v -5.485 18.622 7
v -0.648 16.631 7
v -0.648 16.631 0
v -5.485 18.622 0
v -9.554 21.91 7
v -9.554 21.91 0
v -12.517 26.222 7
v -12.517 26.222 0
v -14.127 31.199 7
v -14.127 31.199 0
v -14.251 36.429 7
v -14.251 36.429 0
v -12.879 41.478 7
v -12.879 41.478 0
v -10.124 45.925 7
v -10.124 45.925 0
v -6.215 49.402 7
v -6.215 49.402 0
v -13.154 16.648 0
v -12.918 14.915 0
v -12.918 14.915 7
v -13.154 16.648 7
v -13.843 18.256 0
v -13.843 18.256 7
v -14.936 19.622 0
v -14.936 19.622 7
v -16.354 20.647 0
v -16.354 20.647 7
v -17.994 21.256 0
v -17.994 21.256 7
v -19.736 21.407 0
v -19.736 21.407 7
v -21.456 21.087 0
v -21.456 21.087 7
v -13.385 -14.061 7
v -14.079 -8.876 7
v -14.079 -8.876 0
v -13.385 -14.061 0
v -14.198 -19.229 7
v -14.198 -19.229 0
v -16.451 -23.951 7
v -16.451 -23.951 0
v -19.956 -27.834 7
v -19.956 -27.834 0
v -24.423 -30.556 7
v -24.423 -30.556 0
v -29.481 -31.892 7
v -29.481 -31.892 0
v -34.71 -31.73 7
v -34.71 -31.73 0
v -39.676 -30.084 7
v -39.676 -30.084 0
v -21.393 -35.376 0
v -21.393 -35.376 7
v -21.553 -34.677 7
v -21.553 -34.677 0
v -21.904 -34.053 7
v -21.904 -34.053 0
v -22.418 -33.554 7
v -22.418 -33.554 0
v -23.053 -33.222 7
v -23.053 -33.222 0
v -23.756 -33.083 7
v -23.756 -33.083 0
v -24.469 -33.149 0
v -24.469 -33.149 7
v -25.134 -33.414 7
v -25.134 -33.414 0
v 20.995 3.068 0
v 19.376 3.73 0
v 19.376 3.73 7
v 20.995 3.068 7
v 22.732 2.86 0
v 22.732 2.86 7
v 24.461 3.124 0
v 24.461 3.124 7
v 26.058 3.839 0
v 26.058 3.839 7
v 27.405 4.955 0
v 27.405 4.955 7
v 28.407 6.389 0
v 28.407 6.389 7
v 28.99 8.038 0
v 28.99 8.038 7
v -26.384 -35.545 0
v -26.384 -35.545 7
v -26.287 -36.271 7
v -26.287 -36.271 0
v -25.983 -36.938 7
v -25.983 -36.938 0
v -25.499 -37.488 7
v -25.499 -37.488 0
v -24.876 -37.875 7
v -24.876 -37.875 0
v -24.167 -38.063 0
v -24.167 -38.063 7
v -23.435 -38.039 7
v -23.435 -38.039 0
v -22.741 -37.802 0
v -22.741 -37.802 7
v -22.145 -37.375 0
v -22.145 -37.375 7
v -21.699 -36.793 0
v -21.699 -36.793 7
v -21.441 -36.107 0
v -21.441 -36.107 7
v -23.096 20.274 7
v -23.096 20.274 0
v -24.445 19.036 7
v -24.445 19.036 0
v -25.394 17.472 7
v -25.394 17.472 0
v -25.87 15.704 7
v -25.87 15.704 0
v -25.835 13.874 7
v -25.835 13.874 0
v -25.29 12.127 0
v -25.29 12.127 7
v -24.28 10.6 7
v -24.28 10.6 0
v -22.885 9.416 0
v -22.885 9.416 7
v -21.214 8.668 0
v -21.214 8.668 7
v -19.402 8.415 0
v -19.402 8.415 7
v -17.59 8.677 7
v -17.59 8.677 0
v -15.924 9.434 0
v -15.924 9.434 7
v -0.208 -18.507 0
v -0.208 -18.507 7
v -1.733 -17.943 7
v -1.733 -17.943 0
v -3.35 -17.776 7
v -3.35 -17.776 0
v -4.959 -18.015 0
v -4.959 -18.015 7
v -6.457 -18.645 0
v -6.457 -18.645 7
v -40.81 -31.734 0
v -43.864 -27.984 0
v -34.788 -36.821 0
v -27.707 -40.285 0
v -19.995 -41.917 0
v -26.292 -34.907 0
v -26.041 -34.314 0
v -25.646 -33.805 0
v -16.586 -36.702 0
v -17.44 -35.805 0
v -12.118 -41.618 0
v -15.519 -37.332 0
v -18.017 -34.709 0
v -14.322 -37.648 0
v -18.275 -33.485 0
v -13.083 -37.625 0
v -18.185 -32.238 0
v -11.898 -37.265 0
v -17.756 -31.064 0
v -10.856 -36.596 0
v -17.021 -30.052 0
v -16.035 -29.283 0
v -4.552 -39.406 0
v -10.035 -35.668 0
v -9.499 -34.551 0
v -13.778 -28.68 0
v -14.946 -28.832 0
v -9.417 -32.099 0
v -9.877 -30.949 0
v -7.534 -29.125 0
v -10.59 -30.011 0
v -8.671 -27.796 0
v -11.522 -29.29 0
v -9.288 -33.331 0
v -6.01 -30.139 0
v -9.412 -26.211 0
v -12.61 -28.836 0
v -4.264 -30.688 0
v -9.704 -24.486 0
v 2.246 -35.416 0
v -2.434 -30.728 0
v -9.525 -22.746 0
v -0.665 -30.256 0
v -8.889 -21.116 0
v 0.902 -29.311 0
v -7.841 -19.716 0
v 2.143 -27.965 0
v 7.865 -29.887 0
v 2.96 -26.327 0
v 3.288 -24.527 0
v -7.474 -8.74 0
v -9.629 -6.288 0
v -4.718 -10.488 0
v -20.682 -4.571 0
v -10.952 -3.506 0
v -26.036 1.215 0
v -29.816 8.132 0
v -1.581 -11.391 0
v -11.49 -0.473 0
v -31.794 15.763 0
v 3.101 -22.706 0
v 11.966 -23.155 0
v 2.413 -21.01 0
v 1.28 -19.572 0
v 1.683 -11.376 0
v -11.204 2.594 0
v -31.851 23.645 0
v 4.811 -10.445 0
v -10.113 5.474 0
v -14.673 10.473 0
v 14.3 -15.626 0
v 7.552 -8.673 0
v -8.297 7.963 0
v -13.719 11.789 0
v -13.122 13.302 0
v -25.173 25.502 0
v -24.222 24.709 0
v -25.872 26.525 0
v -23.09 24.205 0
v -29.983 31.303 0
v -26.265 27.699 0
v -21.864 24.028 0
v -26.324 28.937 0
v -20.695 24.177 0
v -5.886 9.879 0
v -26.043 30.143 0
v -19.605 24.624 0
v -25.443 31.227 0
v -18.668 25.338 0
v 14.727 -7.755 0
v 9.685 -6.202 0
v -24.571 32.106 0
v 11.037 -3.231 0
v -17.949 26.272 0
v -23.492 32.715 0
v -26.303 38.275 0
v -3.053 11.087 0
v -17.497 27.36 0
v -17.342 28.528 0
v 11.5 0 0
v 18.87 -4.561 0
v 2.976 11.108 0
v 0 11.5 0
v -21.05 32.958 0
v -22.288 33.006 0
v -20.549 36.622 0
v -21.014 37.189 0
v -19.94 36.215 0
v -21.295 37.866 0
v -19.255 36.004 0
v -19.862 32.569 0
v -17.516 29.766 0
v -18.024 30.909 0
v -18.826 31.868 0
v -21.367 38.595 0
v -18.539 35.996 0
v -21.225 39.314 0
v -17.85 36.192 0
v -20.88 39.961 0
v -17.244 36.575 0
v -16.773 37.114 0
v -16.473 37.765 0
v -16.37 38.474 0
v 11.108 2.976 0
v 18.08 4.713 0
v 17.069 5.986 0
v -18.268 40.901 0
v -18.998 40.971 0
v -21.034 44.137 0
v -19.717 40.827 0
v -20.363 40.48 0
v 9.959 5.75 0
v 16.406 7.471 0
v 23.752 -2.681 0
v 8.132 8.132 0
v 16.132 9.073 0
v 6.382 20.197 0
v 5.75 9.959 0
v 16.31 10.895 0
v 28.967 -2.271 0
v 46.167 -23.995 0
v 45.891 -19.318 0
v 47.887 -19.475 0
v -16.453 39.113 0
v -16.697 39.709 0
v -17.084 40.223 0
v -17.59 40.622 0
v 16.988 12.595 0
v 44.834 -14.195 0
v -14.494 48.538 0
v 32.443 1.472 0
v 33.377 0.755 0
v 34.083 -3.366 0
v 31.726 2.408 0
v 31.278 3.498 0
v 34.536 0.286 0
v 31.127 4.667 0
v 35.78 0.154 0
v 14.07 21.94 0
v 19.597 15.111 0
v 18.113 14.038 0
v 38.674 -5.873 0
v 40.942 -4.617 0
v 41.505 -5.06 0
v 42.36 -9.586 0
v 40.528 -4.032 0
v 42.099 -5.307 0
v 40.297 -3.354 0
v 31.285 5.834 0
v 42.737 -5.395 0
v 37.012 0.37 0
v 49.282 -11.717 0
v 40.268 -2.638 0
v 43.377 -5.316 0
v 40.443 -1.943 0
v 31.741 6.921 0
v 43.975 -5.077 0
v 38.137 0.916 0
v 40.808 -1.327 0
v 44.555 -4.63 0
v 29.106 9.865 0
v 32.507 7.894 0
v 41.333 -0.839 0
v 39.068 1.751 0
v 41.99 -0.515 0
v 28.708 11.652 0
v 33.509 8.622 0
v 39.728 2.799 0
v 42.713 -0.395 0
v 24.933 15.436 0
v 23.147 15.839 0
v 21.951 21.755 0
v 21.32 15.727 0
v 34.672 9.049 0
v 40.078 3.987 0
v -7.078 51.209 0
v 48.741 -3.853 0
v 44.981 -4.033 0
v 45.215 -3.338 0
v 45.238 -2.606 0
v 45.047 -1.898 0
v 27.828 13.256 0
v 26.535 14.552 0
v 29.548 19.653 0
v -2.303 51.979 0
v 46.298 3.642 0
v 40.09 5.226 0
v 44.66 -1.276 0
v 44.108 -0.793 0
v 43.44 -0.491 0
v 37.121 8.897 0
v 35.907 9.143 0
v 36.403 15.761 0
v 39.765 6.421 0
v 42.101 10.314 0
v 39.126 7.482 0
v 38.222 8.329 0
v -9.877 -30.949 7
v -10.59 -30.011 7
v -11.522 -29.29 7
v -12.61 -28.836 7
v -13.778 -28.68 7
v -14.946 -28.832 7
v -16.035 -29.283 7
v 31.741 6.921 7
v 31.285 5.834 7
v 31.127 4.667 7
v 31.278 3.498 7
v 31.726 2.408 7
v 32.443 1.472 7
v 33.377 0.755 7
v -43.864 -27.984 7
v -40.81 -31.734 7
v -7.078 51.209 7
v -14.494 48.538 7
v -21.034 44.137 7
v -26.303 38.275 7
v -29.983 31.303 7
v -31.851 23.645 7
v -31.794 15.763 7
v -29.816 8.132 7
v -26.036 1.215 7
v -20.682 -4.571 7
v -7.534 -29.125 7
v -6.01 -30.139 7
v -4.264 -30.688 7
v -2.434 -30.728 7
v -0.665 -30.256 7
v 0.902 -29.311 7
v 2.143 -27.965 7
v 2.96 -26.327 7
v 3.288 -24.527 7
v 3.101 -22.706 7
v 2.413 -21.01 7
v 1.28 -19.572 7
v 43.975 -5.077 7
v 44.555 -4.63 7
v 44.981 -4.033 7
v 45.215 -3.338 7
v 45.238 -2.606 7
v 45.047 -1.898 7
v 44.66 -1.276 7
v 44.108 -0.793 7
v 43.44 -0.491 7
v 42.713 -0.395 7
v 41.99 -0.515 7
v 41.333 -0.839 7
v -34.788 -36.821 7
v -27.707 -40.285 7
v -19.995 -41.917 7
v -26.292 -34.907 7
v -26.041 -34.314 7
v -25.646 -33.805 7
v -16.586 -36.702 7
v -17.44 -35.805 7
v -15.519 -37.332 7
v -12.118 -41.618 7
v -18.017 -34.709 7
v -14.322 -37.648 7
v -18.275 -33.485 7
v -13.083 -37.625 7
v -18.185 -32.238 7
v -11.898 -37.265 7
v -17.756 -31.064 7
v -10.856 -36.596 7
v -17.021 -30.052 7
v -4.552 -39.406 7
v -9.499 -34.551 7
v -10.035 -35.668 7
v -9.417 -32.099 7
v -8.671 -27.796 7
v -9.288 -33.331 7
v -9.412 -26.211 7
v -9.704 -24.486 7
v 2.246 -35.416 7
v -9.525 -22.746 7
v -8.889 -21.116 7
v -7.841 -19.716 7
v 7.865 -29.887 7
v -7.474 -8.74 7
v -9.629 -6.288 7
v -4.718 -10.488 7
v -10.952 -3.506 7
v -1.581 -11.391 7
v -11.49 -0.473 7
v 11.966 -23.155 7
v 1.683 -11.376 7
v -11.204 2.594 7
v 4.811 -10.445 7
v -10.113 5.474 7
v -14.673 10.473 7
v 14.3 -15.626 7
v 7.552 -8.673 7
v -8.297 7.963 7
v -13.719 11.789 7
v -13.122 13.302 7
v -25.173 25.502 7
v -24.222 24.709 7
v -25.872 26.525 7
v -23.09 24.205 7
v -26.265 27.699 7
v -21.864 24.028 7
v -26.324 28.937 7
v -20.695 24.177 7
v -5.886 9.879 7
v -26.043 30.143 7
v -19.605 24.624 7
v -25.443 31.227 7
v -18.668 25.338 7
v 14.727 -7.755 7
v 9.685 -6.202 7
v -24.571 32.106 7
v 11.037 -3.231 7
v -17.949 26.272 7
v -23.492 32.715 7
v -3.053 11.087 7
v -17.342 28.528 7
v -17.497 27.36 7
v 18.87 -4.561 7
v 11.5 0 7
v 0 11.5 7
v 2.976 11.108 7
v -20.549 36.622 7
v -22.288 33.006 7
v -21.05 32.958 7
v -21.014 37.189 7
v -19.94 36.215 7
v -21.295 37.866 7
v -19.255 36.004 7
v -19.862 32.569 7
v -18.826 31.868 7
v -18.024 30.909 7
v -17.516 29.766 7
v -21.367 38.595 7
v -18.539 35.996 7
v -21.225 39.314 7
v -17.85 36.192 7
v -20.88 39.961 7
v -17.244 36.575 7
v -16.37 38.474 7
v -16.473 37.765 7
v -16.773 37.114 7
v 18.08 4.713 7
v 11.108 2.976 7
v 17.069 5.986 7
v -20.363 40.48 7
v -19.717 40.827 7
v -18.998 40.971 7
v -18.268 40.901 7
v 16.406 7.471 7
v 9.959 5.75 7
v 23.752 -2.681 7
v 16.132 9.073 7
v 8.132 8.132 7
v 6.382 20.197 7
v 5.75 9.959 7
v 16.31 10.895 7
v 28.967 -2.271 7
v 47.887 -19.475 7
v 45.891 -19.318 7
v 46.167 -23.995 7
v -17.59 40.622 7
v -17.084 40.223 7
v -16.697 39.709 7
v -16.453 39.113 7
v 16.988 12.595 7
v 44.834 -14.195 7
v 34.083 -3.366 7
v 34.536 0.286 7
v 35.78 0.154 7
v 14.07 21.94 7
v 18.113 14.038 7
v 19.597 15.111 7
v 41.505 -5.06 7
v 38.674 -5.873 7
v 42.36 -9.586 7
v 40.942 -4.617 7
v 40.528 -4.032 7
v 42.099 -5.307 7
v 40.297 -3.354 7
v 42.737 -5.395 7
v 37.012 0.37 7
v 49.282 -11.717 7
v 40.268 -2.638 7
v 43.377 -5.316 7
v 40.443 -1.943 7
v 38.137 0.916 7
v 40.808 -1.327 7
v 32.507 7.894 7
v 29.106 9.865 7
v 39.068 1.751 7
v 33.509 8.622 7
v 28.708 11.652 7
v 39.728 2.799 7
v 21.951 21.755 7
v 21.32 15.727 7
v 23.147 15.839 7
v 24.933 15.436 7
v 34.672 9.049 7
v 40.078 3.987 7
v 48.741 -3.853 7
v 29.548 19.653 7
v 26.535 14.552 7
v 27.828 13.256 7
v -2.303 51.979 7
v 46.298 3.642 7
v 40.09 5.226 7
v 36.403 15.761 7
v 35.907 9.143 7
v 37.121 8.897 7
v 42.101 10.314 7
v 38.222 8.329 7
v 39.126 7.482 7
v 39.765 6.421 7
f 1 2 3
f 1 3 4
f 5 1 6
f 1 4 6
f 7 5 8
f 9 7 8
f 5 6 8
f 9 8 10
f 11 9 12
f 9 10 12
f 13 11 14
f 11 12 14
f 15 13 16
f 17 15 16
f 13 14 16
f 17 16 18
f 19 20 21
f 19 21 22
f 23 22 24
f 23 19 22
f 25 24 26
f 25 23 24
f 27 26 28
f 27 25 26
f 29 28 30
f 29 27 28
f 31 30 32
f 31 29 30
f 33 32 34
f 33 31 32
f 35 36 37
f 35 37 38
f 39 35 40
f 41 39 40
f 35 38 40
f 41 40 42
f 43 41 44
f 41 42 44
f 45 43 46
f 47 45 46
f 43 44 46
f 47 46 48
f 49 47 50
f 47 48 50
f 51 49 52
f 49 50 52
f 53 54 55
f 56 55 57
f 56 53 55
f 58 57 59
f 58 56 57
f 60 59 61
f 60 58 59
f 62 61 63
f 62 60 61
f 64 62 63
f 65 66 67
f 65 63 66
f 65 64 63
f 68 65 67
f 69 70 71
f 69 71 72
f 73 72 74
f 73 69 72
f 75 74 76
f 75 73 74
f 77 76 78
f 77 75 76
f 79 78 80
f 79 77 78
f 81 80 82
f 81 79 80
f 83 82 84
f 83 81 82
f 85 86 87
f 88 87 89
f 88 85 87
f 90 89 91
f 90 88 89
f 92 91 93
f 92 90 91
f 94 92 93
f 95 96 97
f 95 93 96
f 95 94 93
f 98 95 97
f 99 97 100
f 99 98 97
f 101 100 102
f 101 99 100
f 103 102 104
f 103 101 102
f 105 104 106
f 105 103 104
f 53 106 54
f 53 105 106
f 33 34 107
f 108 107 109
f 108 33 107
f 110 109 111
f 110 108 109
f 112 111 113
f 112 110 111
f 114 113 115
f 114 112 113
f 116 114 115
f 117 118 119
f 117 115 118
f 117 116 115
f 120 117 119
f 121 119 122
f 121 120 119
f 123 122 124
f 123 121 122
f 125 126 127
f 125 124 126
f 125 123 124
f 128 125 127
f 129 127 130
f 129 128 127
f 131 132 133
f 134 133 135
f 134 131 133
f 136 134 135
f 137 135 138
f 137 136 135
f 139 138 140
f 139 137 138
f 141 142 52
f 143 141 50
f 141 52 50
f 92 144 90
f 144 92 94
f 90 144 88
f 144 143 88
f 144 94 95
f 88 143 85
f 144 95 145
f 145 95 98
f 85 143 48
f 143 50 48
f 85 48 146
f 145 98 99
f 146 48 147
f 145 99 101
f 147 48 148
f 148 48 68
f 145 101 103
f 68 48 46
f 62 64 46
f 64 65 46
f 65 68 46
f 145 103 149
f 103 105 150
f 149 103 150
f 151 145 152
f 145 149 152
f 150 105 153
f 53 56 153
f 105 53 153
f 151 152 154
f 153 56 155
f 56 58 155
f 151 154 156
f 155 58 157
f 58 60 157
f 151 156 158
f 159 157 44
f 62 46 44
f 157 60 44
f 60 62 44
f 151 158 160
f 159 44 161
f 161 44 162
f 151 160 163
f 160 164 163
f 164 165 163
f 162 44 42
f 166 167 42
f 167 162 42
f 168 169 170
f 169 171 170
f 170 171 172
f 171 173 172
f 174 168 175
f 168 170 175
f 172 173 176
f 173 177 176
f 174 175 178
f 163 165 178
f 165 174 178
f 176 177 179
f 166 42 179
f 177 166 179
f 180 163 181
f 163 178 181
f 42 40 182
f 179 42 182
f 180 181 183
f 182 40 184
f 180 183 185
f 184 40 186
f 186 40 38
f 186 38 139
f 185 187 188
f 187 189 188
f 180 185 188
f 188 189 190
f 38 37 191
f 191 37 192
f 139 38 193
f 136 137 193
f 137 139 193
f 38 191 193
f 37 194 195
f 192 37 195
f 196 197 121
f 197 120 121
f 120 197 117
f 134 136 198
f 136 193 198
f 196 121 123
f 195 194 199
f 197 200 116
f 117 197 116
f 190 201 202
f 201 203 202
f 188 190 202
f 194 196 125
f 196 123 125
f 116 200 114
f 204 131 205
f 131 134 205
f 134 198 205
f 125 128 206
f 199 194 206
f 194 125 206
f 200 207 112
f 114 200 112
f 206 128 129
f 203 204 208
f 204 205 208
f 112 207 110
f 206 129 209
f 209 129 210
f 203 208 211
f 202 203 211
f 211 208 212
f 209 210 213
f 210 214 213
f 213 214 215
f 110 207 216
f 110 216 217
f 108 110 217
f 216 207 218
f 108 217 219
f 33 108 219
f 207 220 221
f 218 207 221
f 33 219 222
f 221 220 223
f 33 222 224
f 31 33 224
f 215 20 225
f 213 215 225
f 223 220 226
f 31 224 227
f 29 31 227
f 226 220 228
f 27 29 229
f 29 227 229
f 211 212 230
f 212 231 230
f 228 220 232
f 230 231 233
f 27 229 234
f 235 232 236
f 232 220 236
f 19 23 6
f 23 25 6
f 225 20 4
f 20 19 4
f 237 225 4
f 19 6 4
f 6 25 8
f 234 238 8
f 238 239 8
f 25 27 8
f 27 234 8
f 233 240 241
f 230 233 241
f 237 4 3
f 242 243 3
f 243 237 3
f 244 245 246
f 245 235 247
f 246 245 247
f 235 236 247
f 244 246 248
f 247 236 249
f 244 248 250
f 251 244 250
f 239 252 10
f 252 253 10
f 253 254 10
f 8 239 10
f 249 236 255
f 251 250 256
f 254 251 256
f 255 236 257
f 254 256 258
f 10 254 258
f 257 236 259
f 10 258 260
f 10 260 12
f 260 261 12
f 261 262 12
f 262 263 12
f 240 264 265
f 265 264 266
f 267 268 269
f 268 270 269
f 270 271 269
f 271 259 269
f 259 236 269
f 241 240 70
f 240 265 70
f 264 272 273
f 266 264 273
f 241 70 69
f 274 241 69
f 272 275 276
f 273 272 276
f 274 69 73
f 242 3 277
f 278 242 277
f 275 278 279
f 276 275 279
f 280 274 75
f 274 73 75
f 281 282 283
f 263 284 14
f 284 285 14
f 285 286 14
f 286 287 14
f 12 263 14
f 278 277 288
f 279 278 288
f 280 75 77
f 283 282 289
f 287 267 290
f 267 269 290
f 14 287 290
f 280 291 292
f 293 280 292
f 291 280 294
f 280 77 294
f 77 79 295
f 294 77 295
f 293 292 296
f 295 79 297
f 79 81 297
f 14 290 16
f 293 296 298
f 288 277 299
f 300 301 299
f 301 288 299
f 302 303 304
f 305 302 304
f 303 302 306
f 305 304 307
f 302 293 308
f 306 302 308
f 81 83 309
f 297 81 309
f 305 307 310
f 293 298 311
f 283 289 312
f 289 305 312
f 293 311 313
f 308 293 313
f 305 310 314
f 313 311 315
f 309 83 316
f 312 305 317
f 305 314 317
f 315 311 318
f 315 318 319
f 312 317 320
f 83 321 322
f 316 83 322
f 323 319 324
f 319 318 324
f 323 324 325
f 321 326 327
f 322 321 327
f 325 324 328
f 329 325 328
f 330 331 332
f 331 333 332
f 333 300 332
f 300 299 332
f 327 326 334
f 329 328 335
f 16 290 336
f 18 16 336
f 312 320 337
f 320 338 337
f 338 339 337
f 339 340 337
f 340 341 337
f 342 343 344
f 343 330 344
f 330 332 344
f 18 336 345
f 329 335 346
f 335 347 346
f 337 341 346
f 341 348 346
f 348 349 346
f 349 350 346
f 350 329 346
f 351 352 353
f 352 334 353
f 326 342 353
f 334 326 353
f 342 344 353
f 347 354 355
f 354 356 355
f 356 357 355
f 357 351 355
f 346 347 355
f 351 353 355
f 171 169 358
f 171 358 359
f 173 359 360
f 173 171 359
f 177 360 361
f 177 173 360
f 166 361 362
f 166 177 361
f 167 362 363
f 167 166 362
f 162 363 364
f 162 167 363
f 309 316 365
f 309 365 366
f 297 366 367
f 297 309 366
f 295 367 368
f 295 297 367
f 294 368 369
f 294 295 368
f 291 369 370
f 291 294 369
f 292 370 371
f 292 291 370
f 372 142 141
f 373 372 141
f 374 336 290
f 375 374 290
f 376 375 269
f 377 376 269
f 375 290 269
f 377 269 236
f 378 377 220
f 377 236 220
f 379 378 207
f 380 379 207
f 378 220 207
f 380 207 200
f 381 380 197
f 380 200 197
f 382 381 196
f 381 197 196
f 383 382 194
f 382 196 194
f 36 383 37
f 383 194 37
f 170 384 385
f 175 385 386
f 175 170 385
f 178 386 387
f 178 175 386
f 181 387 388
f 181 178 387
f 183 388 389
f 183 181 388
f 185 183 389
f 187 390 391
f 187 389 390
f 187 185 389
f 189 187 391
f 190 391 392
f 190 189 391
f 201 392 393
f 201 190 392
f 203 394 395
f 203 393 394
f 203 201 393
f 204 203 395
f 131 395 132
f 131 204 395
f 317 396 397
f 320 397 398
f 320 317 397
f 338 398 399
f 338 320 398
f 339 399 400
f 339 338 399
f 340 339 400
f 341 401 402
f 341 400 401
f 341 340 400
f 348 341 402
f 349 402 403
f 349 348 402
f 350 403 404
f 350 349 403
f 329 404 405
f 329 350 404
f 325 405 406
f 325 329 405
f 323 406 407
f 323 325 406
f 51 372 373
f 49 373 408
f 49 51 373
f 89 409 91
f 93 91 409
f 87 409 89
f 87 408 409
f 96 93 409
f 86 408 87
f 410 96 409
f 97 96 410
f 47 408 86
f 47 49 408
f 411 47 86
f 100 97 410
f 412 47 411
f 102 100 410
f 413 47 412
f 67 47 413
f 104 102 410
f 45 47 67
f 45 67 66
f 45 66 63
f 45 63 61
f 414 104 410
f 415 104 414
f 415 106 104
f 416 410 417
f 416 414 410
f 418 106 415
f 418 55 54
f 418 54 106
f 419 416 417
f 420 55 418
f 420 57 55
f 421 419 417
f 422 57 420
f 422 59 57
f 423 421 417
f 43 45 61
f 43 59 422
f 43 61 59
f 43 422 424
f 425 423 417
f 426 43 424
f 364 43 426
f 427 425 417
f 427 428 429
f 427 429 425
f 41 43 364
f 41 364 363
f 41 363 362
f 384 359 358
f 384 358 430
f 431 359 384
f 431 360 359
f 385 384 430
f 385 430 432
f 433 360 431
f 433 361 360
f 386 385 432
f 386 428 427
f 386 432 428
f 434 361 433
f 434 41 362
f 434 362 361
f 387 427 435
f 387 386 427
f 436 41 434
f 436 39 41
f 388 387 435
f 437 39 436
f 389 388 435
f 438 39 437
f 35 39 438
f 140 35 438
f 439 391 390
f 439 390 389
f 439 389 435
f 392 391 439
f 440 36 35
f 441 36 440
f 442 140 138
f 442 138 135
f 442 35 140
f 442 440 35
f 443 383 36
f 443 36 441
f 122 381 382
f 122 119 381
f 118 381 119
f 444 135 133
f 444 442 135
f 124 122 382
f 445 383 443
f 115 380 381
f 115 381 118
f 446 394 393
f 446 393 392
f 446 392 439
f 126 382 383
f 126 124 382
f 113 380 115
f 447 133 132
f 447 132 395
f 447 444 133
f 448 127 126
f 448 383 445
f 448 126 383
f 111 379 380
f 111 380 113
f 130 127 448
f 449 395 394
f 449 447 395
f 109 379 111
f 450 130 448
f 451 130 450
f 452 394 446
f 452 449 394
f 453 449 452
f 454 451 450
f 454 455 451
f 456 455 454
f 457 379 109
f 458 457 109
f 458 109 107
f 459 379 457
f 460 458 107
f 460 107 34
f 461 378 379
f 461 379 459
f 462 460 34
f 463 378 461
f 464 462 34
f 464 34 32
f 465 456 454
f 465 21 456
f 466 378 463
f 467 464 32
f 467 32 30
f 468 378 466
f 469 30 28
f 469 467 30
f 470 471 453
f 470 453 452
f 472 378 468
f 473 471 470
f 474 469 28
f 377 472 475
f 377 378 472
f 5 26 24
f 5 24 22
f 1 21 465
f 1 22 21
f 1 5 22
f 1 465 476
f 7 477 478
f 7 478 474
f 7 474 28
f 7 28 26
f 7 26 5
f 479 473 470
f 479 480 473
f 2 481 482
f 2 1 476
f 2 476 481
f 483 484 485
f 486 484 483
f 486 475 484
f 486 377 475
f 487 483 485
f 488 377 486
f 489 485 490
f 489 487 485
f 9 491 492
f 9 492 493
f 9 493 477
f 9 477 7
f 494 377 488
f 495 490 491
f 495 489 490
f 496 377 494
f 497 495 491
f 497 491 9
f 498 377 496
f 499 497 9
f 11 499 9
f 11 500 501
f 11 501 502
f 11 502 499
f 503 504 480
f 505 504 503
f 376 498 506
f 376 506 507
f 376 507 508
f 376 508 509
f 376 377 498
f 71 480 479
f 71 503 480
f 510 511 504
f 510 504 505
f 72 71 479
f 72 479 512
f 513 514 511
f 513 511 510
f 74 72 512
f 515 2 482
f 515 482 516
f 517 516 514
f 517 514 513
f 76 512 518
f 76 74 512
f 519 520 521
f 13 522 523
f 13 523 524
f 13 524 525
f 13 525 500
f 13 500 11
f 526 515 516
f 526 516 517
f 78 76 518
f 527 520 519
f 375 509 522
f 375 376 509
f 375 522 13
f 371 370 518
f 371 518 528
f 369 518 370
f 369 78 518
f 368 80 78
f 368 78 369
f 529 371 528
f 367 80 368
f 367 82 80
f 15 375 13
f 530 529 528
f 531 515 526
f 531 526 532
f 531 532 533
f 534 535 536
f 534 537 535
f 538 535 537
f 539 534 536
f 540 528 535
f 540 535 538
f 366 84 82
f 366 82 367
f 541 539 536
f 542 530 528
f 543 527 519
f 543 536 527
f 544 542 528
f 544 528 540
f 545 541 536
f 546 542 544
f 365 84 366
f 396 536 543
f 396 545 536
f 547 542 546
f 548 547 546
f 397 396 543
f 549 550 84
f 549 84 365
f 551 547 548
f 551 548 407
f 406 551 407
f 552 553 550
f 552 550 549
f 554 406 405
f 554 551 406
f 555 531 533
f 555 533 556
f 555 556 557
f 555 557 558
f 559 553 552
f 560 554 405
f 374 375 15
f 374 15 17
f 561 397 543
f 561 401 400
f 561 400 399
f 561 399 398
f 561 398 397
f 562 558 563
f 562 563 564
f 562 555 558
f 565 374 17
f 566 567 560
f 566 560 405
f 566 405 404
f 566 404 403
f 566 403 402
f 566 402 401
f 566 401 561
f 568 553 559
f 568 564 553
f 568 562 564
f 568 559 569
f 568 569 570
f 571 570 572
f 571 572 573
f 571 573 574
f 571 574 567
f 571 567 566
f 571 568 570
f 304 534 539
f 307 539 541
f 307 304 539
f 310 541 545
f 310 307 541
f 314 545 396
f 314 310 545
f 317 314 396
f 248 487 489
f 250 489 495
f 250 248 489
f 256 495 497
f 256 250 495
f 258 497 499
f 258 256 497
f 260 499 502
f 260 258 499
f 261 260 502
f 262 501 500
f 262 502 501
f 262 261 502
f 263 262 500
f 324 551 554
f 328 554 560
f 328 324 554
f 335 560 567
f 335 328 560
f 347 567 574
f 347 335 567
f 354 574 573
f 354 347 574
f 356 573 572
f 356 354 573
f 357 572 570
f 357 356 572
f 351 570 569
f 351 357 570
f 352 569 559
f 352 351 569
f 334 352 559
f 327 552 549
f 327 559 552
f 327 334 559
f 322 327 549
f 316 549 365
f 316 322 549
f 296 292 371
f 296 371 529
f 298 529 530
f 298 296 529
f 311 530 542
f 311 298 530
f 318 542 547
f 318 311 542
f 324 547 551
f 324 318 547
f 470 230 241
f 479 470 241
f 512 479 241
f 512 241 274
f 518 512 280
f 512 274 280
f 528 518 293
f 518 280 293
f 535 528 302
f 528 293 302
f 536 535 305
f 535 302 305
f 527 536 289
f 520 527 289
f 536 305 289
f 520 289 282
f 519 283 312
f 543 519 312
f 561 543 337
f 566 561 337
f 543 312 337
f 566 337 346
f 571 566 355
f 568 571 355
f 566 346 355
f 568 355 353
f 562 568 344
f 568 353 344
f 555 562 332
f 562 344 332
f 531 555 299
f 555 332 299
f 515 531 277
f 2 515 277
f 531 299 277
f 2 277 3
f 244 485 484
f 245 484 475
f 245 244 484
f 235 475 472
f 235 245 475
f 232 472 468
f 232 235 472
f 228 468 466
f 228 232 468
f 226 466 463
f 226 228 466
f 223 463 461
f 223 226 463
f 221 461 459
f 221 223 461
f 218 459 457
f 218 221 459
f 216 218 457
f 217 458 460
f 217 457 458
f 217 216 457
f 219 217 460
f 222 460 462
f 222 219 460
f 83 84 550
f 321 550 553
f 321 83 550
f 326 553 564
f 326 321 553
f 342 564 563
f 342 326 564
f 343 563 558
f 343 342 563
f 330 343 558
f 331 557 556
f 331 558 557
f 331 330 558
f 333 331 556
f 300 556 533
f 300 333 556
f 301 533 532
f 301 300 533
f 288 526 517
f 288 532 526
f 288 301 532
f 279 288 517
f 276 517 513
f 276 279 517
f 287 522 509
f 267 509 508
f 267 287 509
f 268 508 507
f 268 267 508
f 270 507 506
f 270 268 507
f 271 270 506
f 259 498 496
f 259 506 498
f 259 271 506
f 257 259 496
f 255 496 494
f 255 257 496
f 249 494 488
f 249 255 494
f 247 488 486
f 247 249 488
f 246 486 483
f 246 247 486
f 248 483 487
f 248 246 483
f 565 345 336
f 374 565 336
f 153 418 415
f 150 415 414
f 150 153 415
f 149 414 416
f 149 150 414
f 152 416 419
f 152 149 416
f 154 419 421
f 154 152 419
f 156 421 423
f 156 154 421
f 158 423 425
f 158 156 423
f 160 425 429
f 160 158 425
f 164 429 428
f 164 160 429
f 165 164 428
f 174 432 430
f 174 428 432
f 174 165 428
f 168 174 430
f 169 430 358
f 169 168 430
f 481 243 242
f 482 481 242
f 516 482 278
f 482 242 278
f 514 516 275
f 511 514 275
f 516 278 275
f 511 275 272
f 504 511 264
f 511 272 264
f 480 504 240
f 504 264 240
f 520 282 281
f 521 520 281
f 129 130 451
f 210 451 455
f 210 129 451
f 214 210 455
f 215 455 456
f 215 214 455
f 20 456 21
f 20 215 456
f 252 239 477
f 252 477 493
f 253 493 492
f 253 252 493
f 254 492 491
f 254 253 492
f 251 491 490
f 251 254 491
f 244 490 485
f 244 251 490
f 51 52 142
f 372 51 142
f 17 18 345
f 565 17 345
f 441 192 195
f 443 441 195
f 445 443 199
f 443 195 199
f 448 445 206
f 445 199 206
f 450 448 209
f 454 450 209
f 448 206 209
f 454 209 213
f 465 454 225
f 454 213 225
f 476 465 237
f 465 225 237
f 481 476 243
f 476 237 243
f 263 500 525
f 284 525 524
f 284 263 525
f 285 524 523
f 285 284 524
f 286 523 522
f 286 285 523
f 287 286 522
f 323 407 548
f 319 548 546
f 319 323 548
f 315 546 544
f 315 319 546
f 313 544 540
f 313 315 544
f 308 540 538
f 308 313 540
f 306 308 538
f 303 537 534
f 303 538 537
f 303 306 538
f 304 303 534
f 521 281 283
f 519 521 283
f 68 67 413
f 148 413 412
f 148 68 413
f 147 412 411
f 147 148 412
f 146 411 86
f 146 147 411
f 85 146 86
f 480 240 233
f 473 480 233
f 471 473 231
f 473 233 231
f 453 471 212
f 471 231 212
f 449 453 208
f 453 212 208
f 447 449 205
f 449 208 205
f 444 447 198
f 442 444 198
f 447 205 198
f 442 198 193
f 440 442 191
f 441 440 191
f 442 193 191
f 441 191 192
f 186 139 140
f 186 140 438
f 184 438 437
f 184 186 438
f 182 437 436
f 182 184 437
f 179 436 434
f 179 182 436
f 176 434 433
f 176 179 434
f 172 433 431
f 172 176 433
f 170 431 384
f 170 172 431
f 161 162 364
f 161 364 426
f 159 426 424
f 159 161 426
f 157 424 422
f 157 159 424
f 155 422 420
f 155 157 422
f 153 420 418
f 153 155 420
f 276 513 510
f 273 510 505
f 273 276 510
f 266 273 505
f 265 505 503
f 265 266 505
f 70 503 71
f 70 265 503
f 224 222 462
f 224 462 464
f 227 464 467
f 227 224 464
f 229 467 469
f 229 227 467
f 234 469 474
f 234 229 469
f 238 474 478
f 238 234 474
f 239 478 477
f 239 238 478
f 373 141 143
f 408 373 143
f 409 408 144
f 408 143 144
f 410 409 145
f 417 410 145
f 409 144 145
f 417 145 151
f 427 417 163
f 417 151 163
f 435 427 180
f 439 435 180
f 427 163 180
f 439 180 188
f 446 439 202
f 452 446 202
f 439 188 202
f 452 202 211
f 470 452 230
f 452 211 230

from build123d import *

# Parameters (mm, degrees)
F1_DEPTH = 7
F4_DEPTH = 25
F5_DEPTH = 25
F6_DEPTH = 25
F7_COUNT = 3
F8_DEPTH = 7


# Not quite as in the source:
# - a feature names something its author has since deleted; it is built from what else it names


with BuildPart() as f1:
    # F0 (on Top) → F1 (new body)
    with BuildSketch(Plane.XY):
        with BuildLine():
            ThreePointArc((-13.7992422924, -9.0114684358), (-14.4938657477, 7.8456043045), (0, 16.4810694803))
            ThreePointArc((0, 16.4810694803), (-14.068080809, 30.8723339162), (-6.2153203117, 49.4021353799))
            Line((-6.2153203117, 49.4021353799), (-2.3028528943, 51.9794964298))
            Line((-2.3028528943, 51.9794964298), (-7.0776391154, 51.2091623618))
            ThreePointArc((-7.0776391154, 51.2091623618), (-31.8683563703, 23.4907745685), (-13.7992422924, -9.0114684358))
        make_face()
    extrude(amount=F1_DEPTH)

    # F2 (on Top) → F4 (cut)
    with BuildSketch(Plane.XY):
        with BuildLine():
            ThreePointArc((-19.9399101365, 36.2145881717), (-17.5331910144, 36.3619404524), (-16.370389089, 38.4742617607))
            ThreePointArc((-16.370389089, 38.4742617607), (-16.6966666914, 39.7091427016), (-17.5903338395, 40.6216924484))
            ThreePointArc((-17.5903338395, 40.6216924484), (-18.870389089, 38.4742617607), (-19.9399101365, 36.2145881717))
        make_face()
        with BuildLine():
            ThreePointArc((-12.9184592818, 14.9145969957), (-15.6103285505, 20.1822473574), (-21.4563486152, 21.0868742954))
            ThreePointArc((-21.4563486152, 21.0868742954), (-19.4184592818, 14.9145969957), (-15.9236151324, 9.4340801978))
            ThreePointArc((-15.9236151324, 9.4340801978), (-13.7190519893, 11.7894159586), (-12.9184592818, 14.9145969957))
        make_face()
        with BuildLine():
            ThreePointArc((-15.9236151324, 9.4340801978), (-19.4184592818, 14.9145969957), (-21.4563486152, 21.0868742954))
            ThreePointArc((-21.4563486152, 21.0868742954), (-25.2902206788, 12.1266913129), (-15.9236151324, 9.4340801978))
        make_face()
        with BuildLine():
            ThreePointArc((-17.3422204011, 28.5281271909), (-18.3916105886, 31.4166028999), (-21.0503501441, 32.9579061352))
            ThreePointArc((-21.0503501441, 32.9579061352), (-21.8422204011, 28.5281271909), (-21.8642642373, 24.0281811835))
            ThreePointArc((-21.8642642373, 24.0281811835), (-18.6680431268, 25.3383625238), (-17.3422204011, 28.5281271909))
        make_face()
        with BuildLine():
            ThreePointArc((-21.8642642373, 24.0281811835), (-21.8422204011, 28.5281271909), (-21.0503501441, 32.9579061352))
            ThreePointArc((-21.0503501441, 32.9579061352), (-26.3236437362, 28.9365937035), (-21.8642642373, 24.0281811835))
        make_face()
        with BuildLine():
            ThreePointArc((-19.9399101365, 36.2145881717), (-18.870389089, 38.4742617607), (-17.5903338395, 40.6216924484))
            ThreePointArc((-17.5903338395, 40.6216924484), (-21.0764541807, 39.6503896496), (-19.9399101365, 36.2145881717))
        make_face()
    extrude(amount=-F4_DEPTH, mode=Mode.SUBTRACT)

    # F2 (on Top) → F5 (cut)
    with BuildSketch(Plane.XY):
        with BuildLine():
            ThreePointArc((-19.9399101365, 36.2145881717), (-17.5331910144, 36.3619404524), (-16.370389089, 38.4742617607))
            ThreePointArc((-16.370389089, 38.4742617607), (-16.6966666914, 39.7091427016), (-17.5903338395, 40.6216924484))
            ThreePointArc((-17.5903338395, 40.6216924484), (-18.870389089, 38.4742617607), (-19.9399101365, 36.2145881717))
        make_face()
        with BuildLine():
            ThreePointArc((-12.9184592818, 14.9145969957), (-15.6103285505, 20.1822473574), (-21.4563486152, 21.0868742954))
            ThreePointArc((-21.4563486152, 21.0868742954), (-19.4184592818, 14.9145969957), (-15.9236151324, 9.4340801978))
            ThreePointArc((-15.9236151324, 9.4340801978), (-13.7190519893, 11.7894159586), (-12.9184592818, 14.9145969957))
        make_face()
        with BuildLine():
            ThreePointArc((-15.9236151324, 9.4340801978), (-19.4184592818, 14.9145969957), (-21.4563486152, 21.0868742954))
            ThreePointArc((-21.4563486152, 21.0868742954), (-25.2902206788, 12.1266913129), (-15.9236151324, 9.4340801978))
        make_face()
        with BuildLine():
            ThreePointArc((-17.3422204011, 28.5281271909), (-18.3916105886, 31.4166028999), (-21.0503501441, 32.9579061352))
            ThreePointArc((-21.0503501441, 32.9579061352), (-21.8422204011, 28.5281271909), (-21.8642642373, 24.0281811835))
            ThreePointArc((-21.8642642373, 24.0281811835), (-18.6680431268, 25.3383625238), (-17.3422204011, 28.5281271909))
        make_face()
        with BuildLine():
            ThreePointArc((-21.8642642373, 24.0281811835), (-21.8422204011, 28.5281271909), (-21.0503501441, 32.9579061352))
            ThreePointArc((-21.0503501441, 32.9579061352), (-26.3236437362, 28.9365937035), (-21.8642642373, 24.0281811835))
        make_face()
        with BuildLine():
            ThreePointArc((-19.9399101365, 36.2145881717), (-18.870389089, 38.4742617607), (-17.5903338395, 40.6216924484))
            ThreePointArc((-17.5903338395, 40.6216924484), (-21.0764541807, 39.6503896496), (-19.9399101365, 36.2145881717))
        make_face()
    extrude(amount=-F5_DEPTH, mode=Mode.SUBTRACT)

    # F2 (on Top) → F6 (cut)
    with BuildSketch(Plane.XY):
        with BuildLine():
            ThreePointArc((-19.9399101365, 36.2145881717), (-17.5331910144, 36.3619404524), (-16.370389089, 38.4742617607))
            ThreePointArc((-16.370389089, 38.4742617607), (-16.6966666914, 39.7091427016), (-17.5903338395, 40.6216924484))
            ThreePointArc((-17.5903338395, 40.6216924484), (-18.870389089, 38.4742617607), (-19.9399101365, 36.2145881717))
        make_face()
        with BuildLine():
            ThreePointArc((-12.9184592818, 14.9145969957), (-15.6103285505, 20.1822473574), (-21.4563486152, 21.0868742954))
            ThreePointArc((-21.4563486152, 21.0868742954), (-19.4184592818, 14.9145969957), (-15.9236151324, 9.4340801978))
            ThreePointArc((-15.9236151324, 9.4340801978), (-13.7190519893, 11.7894159586), (-12.9184592818, 14.9145969957))
        make_face()
        with BuildLine():
            ThreePointArc((-15.9236151324, 9.4340801978), (-19.4184592818, 14.9145969957), (-21.4563486152, 21.0868742954))
            ThreePointArc((-21.4563486152, 21.0868742954), (-25.2902206788, 12.1266913129), (-15.9236151324, 9.4340801978))
        make_face()
        with BuildLine():
            ThreePointArc((-17.3422204011, 28.5281271909), (-18.3916105886, 31.4166028999), (-21.0503501441, 32.9579061352))
            ThreePointArc((-21.0503501441, 32.9579061352), (-21.8422204011, 28.5281271909), (-21.8642642373, 24.0281811835))
            ThreePointArc((-21.8642642373, 24.0281811835), (-18.6680431268, 25.3383625238), (-17.3422204011, 28.5281271909))
        make_face()
        with BuildLine():
            ThreePointArc((-21.8642642373, 24.0281811835), (-21.8422204011, 28.5281271909), (-21.0503501441, 32.9579061352))
            ThreePointArc((-21.0503501441, 32.9579061352), (-26.3236437362, 28.9365937035), (-21.8642642373, 24.0281811835))
        make_face()
        with BuildLine():
            ThreePointArc((-19.9399101365, 36.2145881717), (-18.870389089, 38.4742617607), (-17.5903338395, 40.6216924484))
            ThreePointArc((-17.5903338395, 40.6216924484), (-21.0764541807, 39.6503896496), (-19.9399101365, 36.2145881717))
        make_face()
    extrude(amount=F6_DEPTH, mode=Mode.SUBTRACT)


with BuildPart() as f7_1:
    # F7: instance of F1
    add(f1.part.rotate(Axis((0, 0, -1.6987677664), (0, 0, -1)), 1 * 360 / F7_COUNT))


with BuildPart() as f7_2:
    # F7: instance of F1
    add(f1.part.rotate(Axis((0, 0, -1.6987677664), (0, 0, -1)), 2 * 360 / F7_COUNT))


with BuildPart() as f1_1:
    add(f1.part)

    add(f7_1.part)  # F8 merges F7_1

    add(f7_2.part)  # F8 merges F7_2
    # F0 (on Top) → F8 (join)
    with BuildSketch(Plane.XY):
        with BuildLine():
            Line((0, 16.4810694803), (0, 11.5))
            ThreePointArc((0, 11.5), (8.1317279836, 8.1317279836), (11.5, 0))
            ThreePointArc((11.5, 0), (3.2802394095, -11.0222515584), (-9.628700768, -6.2879345989))
            Line((-9.628700768, -6.2879345989), (-13.7992422924, -9.0114684358))
            ThreePointArc((-13.7992422924, -9.0114684358), (4.7010307496, -15.796390762), (16.4810694803, 0))
            ThreePointArc((16.4810694803, 0), (11.6538759907, 11.6538759907), (0, 16.4810694803))
        make_face()
        with BuildLine():
            ThreePointArc((-9.628700768, -6.2879345989), (-10.1133883513, 5.4744292905), (0, 11.5))
            Line((0, 11.5), (0, 16.4810694803))
            ThreePointArc((0, 16.4810694803), (-14.4938657477, 7.8456043045), (-13.7992422924, -9.0114684358))
            Line((-13.7992422924, -9.0114684358), (-9.628700768, -6.2879345989))
        make_face()
    extrude(amount=F8_DEPTH)


solid = f1_1.part
